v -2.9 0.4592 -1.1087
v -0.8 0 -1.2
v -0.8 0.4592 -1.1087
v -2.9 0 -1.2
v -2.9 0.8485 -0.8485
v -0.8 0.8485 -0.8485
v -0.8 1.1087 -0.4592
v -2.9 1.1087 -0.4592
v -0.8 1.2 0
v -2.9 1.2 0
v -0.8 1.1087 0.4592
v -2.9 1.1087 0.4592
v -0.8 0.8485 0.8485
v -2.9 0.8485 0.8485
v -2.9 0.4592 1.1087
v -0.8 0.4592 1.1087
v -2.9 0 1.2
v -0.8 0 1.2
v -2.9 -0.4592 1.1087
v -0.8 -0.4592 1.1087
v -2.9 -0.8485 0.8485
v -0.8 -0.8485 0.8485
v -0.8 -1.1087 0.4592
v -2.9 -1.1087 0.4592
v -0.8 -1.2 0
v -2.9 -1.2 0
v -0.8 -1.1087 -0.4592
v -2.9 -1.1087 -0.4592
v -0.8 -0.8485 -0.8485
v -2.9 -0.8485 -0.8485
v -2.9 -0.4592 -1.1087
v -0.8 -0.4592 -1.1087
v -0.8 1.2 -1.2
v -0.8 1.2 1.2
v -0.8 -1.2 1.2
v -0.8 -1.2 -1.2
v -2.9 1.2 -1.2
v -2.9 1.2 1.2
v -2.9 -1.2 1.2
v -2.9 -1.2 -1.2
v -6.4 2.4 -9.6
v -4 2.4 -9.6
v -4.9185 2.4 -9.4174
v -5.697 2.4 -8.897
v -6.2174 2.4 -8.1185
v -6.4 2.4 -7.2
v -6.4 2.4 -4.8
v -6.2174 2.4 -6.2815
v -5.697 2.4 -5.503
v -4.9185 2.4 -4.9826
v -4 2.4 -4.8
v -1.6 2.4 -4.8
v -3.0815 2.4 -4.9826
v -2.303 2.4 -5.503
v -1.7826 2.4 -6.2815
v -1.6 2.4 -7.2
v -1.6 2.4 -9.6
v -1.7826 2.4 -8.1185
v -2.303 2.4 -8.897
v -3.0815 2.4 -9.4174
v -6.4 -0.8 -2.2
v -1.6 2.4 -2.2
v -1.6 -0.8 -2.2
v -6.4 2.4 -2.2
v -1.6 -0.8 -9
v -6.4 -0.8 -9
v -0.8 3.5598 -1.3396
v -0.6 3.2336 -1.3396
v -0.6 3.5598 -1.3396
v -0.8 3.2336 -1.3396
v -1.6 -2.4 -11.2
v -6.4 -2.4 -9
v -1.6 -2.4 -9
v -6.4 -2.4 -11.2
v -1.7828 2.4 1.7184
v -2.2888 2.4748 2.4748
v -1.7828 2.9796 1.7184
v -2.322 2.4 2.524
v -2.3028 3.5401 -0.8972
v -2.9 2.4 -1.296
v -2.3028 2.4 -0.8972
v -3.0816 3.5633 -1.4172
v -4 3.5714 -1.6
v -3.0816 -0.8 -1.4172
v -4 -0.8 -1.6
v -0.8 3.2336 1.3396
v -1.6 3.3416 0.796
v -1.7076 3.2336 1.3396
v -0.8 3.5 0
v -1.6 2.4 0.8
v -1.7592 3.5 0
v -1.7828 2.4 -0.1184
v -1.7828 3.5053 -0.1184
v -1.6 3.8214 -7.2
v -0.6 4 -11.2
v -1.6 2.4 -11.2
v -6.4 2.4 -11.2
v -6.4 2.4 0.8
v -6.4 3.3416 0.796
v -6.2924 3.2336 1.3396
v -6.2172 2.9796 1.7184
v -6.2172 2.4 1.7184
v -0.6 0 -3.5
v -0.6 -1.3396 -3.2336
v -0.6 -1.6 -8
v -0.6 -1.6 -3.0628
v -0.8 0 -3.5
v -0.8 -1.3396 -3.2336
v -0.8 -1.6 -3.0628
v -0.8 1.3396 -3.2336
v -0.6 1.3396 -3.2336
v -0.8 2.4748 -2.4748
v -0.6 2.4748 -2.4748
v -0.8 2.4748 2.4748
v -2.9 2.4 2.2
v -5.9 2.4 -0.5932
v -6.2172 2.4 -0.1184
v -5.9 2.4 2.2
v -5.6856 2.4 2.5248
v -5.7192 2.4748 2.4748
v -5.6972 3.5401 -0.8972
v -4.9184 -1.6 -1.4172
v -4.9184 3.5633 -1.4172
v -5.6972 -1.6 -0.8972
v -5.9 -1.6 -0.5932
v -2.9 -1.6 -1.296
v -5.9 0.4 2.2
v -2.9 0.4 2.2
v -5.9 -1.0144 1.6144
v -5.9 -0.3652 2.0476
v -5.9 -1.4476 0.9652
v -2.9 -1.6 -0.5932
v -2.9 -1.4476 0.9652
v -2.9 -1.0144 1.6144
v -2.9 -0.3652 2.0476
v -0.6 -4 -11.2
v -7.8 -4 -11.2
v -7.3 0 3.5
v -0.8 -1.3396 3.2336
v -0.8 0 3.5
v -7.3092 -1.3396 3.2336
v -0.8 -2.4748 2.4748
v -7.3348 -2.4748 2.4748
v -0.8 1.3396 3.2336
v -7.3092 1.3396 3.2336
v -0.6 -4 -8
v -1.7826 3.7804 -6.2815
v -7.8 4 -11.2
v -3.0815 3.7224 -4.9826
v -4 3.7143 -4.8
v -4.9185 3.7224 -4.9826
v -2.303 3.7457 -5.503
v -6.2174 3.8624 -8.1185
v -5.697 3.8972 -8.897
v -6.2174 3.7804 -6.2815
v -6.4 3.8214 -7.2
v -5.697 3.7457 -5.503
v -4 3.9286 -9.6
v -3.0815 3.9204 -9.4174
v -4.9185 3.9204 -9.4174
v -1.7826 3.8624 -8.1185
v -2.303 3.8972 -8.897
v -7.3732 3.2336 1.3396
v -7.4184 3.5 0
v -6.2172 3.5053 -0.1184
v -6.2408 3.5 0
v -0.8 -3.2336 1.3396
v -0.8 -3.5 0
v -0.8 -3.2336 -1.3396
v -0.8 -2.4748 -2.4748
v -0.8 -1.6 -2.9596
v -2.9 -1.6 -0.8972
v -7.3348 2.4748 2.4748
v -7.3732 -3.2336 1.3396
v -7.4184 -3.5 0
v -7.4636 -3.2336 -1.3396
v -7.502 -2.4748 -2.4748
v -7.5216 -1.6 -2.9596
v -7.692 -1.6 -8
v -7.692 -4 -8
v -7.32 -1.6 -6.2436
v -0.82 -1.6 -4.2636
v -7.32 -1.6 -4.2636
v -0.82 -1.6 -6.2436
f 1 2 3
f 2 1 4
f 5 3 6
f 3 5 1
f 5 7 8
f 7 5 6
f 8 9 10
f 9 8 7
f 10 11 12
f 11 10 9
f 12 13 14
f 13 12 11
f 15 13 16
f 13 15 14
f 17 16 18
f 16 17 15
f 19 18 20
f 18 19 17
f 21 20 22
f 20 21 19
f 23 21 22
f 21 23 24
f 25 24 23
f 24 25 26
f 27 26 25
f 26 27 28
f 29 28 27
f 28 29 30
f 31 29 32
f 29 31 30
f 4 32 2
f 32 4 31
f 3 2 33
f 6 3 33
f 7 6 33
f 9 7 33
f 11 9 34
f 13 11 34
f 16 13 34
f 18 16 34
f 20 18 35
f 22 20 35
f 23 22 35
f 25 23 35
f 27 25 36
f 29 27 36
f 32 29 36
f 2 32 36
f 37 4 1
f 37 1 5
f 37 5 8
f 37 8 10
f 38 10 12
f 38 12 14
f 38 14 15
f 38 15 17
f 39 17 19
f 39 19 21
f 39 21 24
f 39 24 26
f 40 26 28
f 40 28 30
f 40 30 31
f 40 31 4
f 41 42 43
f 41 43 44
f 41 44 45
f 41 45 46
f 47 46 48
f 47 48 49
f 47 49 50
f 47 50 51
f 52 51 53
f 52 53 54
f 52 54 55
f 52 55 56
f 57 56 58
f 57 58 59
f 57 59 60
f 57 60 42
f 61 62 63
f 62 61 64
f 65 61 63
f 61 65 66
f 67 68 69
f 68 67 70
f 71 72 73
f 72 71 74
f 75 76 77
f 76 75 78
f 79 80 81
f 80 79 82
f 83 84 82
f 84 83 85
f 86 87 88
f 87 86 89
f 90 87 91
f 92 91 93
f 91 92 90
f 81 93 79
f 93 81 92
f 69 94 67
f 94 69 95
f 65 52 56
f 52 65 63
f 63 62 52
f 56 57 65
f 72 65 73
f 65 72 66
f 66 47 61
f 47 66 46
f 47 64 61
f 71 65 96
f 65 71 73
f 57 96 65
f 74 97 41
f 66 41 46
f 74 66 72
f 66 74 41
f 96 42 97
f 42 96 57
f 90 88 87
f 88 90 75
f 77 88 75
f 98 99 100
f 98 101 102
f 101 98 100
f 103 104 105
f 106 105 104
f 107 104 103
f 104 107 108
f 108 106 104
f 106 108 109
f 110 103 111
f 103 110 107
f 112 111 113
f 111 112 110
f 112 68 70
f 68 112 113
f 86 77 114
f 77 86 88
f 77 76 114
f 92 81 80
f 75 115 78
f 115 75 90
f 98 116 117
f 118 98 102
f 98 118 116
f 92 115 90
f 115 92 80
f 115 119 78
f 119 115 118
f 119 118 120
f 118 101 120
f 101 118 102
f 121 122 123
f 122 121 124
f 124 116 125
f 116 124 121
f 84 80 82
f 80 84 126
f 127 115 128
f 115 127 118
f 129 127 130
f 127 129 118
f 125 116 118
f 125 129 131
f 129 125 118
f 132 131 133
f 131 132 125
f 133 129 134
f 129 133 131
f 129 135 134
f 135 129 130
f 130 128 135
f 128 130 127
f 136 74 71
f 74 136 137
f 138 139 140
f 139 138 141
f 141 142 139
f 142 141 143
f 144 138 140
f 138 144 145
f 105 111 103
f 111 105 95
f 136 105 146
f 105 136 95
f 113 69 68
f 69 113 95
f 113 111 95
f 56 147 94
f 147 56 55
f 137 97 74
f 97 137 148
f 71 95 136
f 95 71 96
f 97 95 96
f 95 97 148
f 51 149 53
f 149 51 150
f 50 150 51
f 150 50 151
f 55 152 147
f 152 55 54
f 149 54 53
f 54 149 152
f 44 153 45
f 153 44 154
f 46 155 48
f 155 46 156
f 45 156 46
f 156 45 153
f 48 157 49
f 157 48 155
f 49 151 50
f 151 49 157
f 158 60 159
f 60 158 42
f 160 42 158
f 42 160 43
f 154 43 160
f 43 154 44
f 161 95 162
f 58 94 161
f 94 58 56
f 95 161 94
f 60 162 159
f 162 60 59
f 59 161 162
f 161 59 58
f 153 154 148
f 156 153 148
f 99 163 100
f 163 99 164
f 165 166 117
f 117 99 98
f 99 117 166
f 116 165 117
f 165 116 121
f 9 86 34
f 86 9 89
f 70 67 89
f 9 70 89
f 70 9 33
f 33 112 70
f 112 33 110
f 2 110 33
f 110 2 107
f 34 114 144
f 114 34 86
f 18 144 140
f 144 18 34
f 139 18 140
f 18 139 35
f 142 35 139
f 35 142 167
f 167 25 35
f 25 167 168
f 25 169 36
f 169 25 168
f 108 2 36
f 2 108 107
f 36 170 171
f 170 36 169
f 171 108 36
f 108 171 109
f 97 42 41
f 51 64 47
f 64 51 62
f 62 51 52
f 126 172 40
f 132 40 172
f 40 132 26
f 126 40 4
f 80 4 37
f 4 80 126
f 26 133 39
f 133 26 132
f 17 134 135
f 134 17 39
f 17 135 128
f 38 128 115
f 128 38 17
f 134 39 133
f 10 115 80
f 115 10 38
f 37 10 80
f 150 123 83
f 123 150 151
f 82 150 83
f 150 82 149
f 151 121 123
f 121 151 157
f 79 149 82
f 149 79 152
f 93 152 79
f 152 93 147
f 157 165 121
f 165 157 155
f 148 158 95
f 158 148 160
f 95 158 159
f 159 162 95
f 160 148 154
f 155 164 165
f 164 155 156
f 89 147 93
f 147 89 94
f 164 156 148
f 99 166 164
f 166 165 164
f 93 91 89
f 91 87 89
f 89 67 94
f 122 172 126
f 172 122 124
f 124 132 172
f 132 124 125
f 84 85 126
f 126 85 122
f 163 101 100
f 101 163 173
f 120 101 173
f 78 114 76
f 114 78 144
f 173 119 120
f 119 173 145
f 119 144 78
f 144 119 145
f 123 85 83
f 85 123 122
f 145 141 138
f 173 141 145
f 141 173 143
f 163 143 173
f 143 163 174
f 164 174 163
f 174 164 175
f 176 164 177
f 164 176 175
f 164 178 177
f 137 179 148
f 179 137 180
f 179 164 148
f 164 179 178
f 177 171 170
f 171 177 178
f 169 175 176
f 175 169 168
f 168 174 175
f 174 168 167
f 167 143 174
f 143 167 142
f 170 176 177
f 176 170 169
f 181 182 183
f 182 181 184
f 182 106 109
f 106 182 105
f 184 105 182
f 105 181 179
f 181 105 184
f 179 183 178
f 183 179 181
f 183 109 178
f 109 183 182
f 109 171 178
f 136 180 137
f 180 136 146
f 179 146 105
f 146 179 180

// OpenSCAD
use <../lib.scad>
use <s/3817bs01.scad>
use <s/3817bs03.scad>
function ldraw_lib__3816bp8h() = [
// 0 ~Minifig Leg Right with Reflective Stripe Pattern (Obsolete)
// 0 Name: 3816bp8h.dat
// 0 Author: Chris Dee [cwdee]
// 0 !LDRAW_ORG Part UPDATE 2023-03
// 0 !LICENSE Licensed under CC BY 4.0 : see CAreadme.txt
// 
// 0 BFC CERTIFY CCW
  [0,"BFC","CERTIFY"],
  [0,"BFC","CCW"],
// 
// 0 !KEYWORDS Emmet, Set 70818
// 
// 0 !CMDLINE -c25
// 
// 0 !HISTORY 2015-10-27 [Christophe_Mitillo] Original pattern design
// 0 !HISTORY 2020-06-13 [cwdee] Adapted to corrected geometry
// 0 !HISTORY 2020-09-05 [PTadmin] Official Update 2020-02
// 0 !HISTORY 2023-05-21 [Holly-Wood] Obsoleted due to bad geometry
// 0 !HISTORY 2023-06-24 [OrionP] Official Update 2023-03
// 
// 
// 1 16 0 0 0 -1 0 0 0 1 0 0 0 1 s\3817bs01.dat
  [1,16,0,0,0,-1,0,0,0,1,0,0,0,1, ldraw_lib__s__3817bs01()],
// 0 // Curve
// 1 16 0 0 0 -1 0 0 0 1 0 0 0 1 s\3817bs03.dat
  [1,16,0,0,0,-1,0,0,0,1,0,0,0,1, ldraw_lib__s__3817bs03()],
// 0 // Front pattern
// 4 80 -18.3 15.609 -4 -2.05 15.609 -4 -2.05 10.659 -4 -18.3 10.659 -4
  [4,80,-18.3,15.609,-4,-2.05,15.609,-4,-2.05,10.659,-4,-18.3,10.659,-4],
// 4 16 -1.5 20 -4 -1.5 7.657 -4 -2 7.657 -4 -2.05 10.659 -4
  [4,16,-1.5,20,-4,-1.5,7.657,-4,-2,7.657,-4,-2.05,10.659,-4],
// 3 16 -2.05 15.609 -4 -1.5 20 -4 -2.05 10.659 -4
  [3,16,-2.05,15.609,-4,-1.5,20,-4,-2.05,10.659,-4],
// 4 16 -19.23 20 -4 -1.5 20 -4 -2.05 15.609 -4 -18.3 15.609 -4
  [4,16,-19.23,20,-4,-1.5,20,-4,-2.05,15.609,-4,-18.3,15.609,-4],
// 4 16 -18.3 15.609 -4 -18.3 10.659 -4 -18.804 7.399 -4 -19.23 20 -4
  [4,16,-18.3,15.609,-4,-18.3,10.659,-4,-18.804,7.399,-4,-19.23,20,-4],
// 4 16 -2.05 10.659 -4 -2 7.657 -4 -18.804 7.399 -4 -18.3 10.659 -4
  [4,16,-2.05,10.659,-4,-2,7.657,-4,-18.804,7.399,-4,-18.3,10.659,-4],
// 3 16 -2 7.657 -4 -2 7.399 -4 -18.804 7.399 -4
  [3,16,-2,7.657,-4,-2,7.399,-4,-18.804,7.399,-4],
// 0 // Foot Front
// 4 16 -1.5 28 -10 -1.5 20 -10 -19.23 20 -10 -19.5 28 -10
  [4,16,-1.5,28,-10,-1.5,20,-10,-19.23,20,-10,-19.5,28,-10],
// 0 // Foot Top
// 4 16 -19.23 20 -4 -19.23 20 -10 -1.5 20 -10 -1.5 20 -4
  [4,16,-19.23,20,-4,-19.23,20,-10,-1.5,20,-10,-1.5,20,-4],
];
module ldraw_lib__3816bp8h(step=0, col=false, unit=2/5, alt=false, line=0.2, solid=!$preview)
    makepoly(ldraw_lib__3816bp8h(), step=step, col=col, unit=unit, alt=alt, line=line, solid=solid);
ldraw_lib__3816bp8h(line=0.2);
